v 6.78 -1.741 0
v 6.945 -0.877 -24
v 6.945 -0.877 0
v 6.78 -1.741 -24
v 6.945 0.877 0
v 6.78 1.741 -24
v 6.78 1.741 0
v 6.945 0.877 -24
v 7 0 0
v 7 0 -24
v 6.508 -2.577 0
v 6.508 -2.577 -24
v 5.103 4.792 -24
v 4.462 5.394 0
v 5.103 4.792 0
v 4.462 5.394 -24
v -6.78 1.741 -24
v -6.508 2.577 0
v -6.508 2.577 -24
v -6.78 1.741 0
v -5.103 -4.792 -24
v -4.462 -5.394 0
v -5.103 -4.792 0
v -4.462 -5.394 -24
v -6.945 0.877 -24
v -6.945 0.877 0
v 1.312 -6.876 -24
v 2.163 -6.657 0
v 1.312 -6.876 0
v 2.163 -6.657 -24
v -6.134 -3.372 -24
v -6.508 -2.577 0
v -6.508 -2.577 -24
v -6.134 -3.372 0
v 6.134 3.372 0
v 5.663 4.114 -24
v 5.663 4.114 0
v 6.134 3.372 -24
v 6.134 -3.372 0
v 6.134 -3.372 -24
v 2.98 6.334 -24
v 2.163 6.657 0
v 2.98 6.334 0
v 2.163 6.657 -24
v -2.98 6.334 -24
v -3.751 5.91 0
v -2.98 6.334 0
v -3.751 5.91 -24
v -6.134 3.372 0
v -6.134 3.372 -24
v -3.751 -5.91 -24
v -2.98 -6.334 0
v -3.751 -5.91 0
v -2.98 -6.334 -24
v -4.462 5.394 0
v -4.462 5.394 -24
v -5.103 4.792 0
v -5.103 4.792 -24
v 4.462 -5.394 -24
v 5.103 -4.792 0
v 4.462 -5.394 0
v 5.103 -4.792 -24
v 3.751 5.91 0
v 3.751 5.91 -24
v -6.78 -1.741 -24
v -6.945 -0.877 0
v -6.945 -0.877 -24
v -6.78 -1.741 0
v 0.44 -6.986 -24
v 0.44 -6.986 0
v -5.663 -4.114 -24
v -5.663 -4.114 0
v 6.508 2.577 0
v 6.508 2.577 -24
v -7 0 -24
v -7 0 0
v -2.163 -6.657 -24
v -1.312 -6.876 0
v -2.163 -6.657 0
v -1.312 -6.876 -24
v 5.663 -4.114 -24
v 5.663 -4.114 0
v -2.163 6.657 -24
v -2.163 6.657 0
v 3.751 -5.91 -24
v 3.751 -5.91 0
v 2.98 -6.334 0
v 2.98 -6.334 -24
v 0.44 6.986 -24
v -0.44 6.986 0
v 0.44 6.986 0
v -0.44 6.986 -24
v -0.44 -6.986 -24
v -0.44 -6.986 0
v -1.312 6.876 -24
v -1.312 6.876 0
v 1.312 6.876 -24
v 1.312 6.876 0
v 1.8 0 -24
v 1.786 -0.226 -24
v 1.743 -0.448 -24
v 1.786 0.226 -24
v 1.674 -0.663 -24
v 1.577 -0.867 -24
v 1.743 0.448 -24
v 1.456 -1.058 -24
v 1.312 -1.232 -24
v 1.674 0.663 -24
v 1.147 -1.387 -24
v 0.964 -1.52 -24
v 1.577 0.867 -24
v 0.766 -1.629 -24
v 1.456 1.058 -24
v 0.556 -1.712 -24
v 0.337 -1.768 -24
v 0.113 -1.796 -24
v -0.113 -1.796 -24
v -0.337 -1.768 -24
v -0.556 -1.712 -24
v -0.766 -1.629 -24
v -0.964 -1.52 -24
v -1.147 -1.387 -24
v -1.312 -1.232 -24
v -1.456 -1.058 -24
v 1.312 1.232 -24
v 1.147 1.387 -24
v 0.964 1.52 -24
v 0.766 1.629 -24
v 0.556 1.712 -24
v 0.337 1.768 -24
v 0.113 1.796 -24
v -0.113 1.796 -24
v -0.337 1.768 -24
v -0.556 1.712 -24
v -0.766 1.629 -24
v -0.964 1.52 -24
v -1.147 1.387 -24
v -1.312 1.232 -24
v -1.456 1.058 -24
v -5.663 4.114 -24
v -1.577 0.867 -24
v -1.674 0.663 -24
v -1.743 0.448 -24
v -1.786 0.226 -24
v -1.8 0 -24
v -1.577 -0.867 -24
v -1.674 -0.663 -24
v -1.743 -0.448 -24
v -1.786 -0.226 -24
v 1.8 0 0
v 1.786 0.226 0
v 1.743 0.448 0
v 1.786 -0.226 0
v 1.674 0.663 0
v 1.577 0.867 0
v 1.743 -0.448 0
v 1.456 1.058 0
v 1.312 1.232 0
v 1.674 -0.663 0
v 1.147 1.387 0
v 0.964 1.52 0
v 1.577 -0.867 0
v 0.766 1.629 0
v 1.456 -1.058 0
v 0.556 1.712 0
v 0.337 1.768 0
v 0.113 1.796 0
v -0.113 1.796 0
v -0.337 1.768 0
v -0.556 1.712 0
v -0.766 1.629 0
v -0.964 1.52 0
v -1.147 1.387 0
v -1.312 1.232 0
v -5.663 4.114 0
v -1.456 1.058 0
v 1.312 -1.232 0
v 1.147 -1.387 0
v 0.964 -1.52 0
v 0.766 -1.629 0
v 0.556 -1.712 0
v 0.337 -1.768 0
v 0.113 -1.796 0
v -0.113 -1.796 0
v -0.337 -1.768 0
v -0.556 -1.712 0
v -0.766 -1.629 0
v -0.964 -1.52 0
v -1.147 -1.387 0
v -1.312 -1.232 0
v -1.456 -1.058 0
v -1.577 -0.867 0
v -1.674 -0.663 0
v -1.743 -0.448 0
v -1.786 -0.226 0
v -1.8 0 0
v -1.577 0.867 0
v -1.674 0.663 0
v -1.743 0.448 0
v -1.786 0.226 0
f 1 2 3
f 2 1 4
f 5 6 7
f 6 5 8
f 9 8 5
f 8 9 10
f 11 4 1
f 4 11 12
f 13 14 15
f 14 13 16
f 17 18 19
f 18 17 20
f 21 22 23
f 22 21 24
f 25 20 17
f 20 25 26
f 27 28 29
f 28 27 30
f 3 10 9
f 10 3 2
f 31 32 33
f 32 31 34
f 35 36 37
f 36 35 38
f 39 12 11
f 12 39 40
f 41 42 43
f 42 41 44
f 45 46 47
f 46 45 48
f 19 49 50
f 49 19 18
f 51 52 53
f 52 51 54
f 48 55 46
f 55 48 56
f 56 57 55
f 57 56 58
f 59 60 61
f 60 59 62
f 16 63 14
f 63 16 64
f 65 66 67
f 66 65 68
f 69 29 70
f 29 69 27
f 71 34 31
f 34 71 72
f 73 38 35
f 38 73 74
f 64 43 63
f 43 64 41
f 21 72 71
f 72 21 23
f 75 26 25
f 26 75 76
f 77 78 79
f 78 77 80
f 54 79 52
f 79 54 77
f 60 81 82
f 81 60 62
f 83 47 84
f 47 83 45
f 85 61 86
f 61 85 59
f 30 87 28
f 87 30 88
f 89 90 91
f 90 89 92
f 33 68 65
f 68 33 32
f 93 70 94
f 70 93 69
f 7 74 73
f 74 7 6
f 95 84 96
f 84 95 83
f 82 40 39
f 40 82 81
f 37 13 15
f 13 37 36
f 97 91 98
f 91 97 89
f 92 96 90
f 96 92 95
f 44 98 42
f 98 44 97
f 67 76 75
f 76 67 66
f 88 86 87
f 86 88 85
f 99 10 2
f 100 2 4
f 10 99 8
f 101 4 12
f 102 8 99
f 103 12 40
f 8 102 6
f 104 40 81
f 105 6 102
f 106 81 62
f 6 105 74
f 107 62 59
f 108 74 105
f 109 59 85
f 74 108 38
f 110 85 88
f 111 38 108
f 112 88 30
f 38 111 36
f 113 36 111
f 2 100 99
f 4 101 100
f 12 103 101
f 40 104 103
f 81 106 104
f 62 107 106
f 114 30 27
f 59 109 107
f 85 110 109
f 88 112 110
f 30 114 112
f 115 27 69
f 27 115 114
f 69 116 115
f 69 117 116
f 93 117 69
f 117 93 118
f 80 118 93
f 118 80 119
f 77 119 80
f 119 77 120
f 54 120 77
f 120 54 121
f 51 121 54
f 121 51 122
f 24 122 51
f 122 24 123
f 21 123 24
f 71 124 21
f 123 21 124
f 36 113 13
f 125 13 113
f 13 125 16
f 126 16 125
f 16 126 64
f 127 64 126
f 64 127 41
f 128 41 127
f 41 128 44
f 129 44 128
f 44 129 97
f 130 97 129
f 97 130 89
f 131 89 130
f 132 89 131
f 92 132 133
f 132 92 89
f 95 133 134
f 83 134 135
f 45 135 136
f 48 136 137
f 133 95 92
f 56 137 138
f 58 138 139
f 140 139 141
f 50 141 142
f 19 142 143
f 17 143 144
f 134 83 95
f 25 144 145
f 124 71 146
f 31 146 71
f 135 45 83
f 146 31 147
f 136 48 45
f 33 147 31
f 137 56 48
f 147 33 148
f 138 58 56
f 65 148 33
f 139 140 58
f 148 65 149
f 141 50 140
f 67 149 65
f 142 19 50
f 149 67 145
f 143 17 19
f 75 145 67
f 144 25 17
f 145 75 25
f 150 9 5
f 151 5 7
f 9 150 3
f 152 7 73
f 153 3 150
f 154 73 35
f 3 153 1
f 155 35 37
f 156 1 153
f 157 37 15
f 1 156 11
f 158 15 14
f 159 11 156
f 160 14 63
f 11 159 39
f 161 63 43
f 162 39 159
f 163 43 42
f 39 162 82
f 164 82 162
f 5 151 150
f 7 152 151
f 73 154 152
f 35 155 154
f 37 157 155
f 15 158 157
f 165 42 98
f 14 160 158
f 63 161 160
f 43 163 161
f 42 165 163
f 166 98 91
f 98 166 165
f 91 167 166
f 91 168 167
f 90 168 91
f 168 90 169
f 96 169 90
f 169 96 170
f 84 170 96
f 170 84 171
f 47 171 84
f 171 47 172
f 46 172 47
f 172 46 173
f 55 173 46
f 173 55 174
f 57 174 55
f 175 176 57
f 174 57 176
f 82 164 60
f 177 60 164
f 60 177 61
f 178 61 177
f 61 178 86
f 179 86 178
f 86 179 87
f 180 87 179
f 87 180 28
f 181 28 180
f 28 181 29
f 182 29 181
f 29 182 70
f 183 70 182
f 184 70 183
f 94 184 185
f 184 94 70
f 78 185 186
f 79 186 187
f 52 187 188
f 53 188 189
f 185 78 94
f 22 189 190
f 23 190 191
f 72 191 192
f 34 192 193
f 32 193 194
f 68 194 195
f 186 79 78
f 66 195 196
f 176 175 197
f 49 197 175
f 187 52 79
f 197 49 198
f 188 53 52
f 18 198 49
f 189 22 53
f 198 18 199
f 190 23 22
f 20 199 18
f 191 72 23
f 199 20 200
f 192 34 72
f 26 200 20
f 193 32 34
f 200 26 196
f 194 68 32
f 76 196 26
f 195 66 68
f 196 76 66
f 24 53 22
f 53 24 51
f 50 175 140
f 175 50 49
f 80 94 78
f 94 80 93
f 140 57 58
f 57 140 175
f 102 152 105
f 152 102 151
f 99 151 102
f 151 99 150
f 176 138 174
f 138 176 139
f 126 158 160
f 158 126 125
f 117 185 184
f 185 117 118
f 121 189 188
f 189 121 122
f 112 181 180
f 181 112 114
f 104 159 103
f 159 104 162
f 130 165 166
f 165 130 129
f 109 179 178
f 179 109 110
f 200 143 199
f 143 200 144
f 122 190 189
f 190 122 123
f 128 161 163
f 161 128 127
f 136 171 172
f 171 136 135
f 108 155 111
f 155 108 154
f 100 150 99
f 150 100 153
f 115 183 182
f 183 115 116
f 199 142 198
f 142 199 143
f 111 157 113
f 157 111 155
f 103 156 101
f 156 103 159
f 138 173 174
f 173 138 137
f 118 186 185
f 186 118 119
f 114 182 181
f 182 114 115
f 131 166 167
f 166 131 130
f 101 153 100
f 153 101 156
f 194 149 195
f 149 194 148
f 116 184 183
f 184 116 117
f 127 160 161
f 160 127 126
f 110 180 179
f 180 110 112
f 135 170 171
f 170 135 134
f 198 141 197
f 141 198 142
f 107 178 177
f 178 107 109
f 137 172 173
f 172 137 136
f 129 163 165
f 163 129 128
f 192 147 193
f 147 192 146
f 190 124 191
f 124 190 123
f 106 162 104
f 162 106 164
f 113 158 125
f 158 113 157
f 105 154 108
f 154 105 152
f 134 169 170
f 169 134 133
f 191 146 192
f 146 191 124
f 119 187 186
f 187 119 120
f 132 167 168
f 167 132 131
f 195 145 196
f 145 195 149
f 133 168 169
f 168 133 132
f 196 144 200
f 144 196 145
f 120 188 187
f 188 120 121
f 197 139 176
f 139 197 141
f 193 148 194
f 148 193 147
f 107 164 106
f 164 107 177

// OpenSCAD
$fn = 50;


difference() {
	union() {
		translate(v = [0, 0, -24.0000000000]) {
			cylinder(h = 24, r = 7.0000000000);
		}
		cylinder(h = 0, r = 17.0000000000);
	}
	union() {
		#translate(v = [0, 0, -24]) {
			cylinder(h = 24, r = 1.8000000000);
		}
	}
}
